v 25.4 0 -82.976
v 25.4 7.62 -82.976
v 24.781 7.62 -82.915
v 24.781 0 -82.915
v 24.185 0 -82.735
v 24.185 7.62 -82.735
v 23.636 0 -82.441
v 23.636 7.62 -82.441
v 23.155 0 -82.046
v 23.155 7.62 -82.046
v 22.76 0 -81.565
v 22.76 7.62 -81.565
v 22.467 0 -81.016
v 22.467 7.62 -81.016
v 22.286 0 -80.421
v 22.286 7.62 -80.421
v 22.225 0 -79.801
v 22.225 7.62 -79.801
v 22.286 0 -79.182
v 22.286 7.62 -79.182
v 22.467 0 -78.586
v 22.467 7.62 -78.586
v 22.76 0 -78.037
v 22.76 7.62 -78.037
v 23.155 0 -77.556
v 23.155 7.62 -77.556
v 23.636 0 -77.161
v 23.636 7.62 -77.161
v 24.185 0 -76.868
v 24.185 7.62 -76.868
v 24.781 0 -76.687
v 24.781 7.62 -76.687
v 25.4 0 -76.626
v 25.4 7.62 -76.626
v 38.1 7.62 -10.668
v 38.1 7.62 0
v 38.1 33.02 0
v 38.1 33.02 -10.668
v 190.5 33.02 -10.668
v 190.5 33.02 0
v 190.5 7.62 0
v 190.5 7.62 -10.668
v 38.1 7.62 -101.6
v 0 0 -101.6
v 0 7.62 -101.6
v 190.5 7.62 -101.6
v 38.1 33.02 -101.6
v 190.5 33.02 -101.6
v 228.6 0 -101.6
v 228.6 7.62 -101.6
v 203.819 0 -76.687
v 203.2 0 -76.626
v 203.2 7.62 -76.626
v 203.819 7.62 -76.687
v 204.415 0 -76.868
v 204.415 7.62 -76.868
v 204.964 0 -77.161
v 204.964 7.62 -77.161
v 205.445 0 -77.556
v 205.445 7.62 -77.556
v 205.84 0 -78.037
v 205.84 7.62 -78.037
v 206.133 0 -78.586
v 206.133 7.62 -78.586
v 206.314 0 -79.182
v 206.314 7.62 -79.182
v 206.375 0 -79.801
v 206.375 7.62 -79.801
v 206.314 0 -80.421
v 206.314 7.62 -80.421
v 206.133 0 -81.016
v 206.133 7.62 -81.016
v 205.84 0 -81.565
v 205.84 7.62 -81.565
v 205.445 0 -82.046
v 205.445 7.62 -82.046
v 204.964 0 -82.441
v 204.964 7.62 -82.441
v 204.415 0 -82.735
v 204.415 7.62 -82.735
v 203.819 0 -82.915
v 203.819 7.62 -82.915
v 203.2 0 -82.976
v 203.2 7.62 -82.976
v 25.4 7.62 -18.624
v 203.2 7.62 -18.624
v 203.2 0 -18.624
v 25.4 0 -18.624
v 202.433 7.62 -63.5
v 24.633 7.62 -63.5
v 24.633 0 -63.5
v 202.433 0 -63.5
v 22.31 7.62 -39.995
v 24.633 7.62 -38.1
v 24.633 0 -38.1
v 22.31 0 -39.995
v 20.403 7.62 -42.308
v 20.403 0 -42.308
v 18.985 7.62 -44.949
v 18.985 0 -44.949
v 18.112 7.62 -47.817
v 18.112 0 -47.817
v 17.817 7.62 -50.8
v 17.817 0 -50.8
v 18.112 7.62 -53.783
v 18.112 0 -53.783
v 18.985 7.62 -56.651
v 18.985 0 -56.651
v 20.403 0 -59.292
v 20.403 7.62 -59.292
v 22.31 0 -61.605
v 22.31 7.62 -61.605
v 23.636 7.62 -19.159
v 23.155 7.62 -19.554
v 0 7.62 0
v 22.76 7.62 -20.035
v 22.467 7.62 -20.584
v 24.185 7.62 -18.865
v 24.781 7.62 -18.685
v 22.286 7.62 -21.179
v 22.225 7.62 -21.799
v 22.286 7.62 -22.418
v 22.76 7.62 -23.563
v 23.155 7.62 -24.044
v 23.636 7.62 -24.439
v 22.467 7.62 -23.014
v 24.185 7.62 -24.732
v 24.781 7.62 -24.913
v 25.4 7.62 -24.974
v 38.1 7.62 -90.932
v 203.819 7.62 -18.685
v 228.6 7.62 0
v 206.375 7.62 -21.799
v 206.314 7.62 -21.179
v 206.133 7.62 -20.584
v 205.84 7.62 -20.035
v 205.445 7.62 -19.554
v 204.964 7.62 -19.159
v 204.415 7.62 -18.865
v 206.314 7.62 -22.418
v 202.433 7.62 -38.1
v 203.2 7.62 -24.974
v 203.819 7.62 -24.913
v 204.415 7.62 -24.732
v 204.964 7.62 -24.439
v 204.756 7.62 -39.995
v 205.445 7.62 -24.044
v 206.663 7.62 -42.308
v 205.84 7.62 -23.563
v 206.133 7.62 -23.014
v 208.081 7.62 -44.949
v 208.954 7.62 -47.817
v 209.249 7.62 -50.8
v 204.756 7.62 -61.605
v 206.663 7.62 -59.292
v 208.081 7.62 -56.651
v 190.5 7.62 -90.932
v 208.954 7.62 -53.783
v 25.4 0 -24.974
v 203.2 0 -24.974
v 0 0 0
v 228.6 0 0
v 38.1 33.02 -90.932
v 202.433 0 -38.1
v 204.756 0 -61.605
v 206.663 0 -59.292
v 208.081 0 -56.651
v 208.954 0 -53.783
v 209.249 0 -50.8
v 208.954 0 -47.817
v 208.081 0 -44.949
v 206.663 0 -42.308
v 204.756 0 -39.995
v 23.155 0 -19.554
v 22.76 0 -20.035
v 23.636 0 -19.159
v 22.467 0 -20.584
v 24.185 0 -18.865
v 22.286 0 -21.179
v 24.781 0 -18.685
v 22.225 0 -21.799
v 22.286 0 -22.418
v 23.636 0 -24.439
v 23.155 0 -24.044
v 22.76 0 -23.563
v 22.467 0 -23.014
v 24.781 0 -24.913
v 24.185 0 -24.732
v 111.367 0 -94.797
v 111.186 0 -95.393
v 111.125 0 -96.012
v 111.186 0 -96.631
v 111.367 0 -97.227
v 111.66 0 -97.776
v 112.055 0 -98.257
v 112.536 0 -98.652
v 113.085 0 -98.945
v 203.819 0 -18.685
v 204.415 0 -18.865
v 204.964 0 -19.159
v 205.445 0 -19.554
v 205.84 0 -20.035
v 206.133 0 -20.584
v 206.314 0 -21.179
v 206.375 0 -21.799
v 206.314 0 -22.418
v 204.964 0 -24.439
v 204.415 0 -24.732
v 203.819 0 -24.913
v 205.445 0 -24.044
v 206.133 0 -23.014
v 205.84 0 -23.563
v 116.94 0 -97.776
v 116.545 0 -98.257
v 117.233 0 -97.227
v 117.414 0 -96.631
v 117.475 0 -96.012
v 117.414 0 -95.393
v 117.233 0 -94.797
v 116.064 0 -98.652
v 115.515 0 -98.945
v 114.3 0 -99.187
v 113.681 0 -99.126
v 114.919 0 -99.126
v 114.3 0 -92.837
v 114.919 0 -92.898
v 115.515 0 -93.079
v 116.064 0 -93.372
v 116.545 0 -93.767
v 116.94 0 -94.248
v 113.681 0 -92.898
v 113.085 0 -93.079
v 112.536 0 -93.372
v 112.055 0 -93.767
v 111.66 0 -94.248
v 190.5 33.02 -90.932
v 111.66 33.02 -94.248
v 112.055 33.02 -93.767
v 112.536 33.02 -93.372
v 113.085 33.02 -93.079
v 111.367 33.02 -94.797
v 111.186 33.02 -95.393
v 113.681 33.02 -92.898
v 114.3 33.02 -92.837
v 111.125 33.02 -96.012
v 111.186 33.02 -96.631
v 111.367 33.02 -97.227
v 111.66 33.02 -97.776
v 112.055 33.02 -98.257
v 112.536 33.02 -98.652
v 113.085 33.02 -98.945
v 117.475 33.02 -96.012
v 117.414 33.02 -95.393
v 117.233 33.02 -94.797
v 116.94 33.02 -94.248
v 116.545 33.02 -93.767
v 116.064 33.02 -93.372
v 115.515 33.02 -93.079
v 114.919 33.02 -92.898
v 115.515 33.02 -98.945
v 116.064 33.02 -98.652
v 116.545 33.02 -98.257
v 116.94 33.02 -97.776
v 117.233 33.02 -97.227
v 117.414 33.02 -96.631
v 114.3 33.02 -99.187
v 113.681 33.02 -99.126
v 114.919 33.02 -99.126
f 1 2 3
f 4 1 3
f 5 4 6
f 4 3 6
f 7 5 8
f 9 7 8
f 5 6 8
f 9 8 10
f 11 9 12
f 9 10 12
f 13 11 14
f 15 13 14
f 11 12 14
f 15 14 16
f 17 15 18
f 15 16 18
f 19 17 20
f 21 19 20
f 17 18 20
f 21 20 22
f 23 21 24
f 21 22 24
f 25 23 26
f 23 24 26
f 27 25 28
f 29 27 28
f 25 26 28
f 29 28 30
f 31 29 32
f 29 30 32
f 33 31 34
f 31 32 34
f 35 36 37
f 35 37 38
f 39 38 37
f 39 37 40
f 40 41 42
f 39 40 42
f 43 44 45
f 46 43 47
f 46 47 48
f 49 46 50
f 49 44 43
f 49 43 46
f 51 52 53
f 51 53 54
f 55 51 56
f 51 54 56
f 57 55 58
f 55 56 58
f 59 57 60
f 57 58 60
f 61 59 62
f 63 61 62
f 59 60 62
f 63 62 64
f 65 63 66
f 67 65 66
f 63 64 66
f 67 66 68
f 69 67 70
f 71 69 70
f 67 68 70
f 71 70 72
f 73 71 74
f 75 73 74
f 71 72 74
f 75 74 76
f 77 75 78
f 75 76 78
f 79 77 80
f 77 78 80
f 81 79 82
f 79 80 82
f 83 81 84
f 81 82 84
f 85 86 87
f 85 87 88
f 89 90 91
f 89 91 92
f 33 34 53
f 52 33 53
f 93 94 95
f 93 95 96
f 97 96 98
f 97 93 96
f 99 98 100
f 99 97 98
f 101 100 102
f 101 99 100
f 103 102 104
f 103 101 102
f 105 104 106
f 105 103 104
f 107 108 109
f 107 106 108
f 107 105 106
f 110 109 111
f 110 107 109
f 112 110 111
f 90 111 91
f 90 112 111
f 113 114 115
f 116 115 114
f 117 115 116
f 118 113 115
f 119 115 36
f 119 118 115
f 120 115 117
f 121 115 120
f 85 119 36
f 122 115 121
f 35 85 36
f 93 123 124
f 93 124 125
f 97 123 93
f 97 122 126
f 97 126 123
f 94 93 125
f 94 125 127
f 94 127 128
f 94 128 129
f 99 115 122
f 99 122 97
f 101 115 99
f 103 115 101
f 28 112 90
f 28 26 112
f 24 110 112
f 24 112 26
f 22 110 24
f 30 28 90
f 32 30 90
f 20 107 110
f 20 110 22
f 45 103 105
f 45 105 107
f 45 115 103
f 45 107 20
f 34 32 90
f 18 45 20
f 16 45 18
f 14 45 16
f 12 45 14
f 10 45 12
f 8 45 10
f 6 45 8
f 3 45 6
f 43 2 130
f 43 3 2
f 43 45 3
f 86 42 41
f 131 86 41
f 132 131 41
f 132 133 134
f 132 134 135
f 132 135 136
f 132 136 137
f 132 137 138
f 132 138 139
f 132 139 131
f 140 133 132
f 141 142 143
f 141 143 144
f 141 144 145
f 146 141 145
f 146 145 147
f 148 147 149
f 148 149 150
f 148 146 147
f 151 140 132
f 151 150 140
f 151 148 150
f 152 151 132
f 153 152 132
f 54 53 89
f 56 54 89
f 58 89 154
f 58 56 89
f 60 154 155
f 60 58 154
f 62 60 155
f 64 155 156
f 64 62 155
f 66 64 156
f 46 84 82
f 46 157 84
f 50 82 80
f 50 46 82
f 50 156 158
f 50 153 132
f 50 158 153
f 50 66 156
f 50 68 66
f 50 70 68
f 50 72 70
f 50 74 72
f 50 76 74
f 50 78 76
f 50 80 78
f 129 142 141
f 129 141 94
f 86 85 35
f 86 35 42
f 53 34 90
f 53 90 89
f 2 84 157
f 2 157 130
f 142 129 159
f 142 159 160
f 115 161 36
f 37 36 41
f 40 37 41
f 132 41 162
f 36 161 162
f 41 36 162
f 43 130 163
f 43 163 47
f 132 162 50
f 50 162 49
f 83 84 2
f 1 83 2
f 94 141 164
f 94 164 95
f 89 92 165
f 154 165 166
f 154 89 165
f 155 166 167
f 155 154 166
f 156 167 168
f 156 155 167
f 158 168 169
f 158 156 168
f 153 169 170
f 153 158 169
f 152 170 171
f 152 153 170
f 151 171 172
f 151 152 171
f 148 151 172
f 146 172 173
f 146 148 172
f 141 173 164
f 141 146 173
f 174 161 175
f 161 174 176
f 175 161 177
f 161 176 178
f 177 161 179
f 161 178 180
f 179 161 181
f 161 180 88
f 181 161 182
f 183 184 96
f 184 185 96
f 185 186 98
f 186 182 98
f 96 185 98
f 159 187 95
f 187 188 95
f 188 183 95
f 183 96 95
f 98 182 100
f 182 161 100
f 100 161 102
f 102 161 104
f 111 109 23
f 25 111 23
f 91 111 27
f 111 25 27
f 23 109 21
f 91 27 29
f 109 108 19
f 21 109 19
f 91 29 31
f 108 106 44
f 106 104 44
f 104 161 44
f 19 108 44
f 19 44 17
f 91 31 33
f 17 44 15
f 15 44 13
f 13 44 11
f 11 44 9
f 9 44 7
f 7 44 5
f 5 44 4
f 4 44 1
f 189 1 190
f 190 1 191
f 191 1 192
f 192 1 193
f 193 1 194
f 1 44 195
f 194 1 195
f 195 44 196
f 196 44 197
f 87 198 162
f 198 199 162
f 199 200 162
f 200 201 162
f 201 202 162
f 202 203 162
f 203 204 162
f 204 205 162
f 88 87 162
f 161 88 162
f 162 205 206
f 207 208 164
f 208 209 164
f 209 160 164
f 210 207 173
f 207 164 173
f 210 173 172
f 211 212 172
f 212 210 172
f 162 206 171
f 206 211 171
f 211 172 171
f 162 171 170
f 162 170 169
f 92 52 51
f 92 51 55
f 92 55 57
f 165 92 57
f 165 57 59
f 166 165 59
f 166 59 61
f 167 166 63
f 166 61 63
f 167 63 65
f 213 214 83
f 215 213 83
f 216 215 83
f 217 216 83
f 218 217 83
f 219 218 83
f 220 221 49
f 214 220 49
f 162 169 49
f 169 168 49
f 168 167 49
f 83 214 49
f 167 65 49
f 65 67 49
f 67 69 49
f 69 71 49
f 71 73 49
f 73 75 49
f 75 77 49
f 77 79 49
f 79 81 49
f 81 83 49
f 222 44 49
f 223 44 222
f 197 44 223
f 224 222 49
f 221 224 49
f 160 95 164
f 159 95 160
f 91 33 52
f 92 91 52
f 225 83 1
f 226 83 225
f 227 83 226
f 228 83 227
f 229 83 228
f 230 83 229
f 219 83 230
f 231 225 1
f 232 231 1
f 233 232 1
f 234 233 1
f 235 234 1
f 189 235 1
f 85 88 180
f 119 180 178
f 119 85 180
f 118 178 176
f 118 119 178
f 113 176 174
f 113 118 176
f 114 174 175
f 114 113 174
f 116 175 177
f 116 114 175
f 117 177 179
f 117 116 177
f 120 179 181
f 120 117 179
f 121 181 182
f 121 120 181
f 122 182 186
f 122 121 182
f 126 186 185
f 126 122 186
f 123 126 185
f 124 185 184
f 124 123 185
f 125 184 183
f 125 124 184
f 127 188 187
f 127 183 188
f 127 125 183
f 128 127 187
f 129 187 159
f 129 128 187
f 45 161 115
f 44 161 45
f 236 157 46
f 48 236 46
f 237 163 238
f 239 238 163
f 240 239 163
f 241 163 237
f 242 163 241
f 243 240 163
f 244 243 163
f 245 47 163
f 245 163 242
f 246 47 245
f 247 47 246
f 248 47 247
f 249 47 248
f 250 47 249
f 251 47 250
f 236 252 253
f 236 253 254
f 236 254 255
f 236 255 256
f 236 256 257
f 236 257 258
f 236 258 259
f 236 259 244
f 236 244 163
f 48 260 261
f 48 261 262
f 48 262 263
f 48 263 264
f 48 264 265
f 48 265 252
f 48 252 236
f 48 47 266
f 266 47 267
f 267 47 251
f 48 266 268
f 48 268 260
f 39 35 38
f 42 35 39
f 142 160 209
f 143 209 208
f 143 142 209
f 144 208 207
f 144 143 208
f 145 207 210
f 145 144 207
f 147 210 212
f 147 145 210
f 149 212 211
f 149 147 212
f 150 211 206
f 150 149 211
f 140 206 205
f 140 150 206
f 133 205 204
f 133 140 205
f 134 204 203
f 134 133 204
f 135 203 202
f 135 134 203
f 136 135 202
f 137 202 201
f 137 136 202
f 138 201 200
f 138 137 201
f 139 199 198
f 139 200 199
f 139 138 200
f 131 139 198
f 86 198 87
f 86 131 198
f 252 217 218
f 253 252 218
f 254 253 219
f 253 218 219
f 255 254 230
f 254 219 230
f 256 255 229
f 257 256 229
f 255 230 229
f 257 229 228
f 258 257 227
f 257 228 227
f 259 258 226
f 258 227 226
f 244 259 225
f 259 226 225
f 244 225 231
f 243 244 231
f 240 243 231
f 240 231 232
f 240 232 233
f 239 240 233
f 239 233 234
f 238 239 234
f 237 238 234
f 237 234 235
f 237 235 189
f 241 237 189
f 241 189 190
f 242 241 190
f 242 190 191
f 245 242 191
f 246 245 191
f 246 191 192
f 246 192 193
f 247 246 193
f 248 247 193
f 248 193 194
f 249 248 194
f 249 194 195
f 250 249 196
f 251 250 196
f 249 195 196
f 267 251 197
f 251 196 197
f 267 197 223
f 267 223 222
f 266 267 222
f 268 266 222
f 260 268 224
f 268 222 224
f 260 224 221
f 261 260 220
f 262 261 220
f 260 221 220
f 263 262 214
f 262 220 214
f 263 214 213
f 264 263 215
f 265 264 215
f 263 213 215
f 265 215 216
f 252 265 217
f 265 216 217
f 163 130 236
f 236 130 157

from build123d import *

# Parameters (mm, degrees)
SKETCH2_W           = 228.6
SKETCH2_H           = 101.6
BOSS_EXTRUDE1_DEPTH = 7.62
SKETCH3_W           = 152.4
SKETCH3_H           = 10.668
BOSS_EXTRUDE2_DEPTH = 25.4
CUT_EXTRUDE1_DEPTH  = 8.62
CUT_EXTRUDE2_DEPTH  = 8.62
SKETCH6_R           = 3.175
CUT_EXTRUDE3_DEPTH  = 34.02


with BuildPart() as part:
    # Sketch2 → Boss-Extrude1 (new body)
    with BuildSketch(Plane(origin=(0, 0, 0), x_dir=(1, 0, 0), z_dir=(0, 1, 0))):
        with Locations((114.3, 50.8)):
            Rectangle(SKETCH2_W, SKETCH2_H)
    extrude(amount=BOSS_EXTRUDE1_DEPTH)

    # Sketch3 → Boss-Extrude2 (add)
    with BuildSketch(Plane(origin=(0, 7.62, 0), x_dir=(1, 0, 0), z_dir=(0, 1, 0))):
        with Locations((114.3, 5.334)):
            Rectangle(SKETCH3_W, SKETCH3_H)
        with Locations((114.3, 96.266)):
            Rectangle(SKETCH3_W, SKETCH3_H)
    extrude(amount=BOSS_EXTRUDE2_DEPTH)

    # Sketch4 → Cut-Extrude1 (cut, through all)
    with BuildSketch(Plane(origin=(0, 7.62, 0), x_dir=(1, 0, 0), z_dir=(0, 1, 0))):
        with BuildLine():
            Line((25.4, 24.973599875), (203.2, 24.973599875))
            ThreePointArc((203.2, 24.973599875), (206.375, 21.798599875), (203.2, 18.623599875))
            Line((203.2, 18.623599875), (25.4, 18.623599875))
            ThreePointArc((25.4, 18.623599875), (22.225, 21.798599875), (25.4, 24.973599875))
        make_face()
        with BuildLine():
            Line((25.4, 76.626400125), (203.2, 76.626400125))
            ThreePointArc((203.2, 76.626400125), (206.375, 79.801400125), (203.2, 82.976400125))
            Line((203.2, 82.976400125), (25.4, 82.976400125))
            ThreePointArc((25.4, 82.976400125), (22.225, 79.801400125), (25.4, 76.626400125))
        make_face()
    extrude(amount=-CUT_EXTRUDE1_DEPTH, mode=Mode.SUBTRACT)

    # Sketch5 → Cut-Extrude2 (cut, through all)
    with BuildSketch(Plane(origin=(0, 7.62, 0), x_dir=(1, 0, 0), z_dir=(0, 1, 0))):
        with BuildLine():
            Line((24.632893217, 63.5), (202.432893217, 63.5))
            ThreePointArc((202.432893217, 63.5), (209.248666249, 50.8), (202.432893217, 38.1))
            Line((202.432893217, 38.1), (24.632893217, 38.1))
            ThreePointArc((24.632893217, 38.1), (17.817120184, 50.8), (24.632893217, 63.5))
        make_face()
    extrude(amount=-CUT_EXTRUDE2_DEPTH, mode=Mode.SUBTRACT)

    # Sketch6 → Cut-Extrude3 (cut, through all)
    with BuildSketch(Plane.XZ):
        with Locations((114.3, -96.012)):
            Circle(SKETCH6_R)
    extrude(amount=-CUT_EXTRUDE3_DEPTH, mode=Mode.SUBTRACT)


solid = part.part
